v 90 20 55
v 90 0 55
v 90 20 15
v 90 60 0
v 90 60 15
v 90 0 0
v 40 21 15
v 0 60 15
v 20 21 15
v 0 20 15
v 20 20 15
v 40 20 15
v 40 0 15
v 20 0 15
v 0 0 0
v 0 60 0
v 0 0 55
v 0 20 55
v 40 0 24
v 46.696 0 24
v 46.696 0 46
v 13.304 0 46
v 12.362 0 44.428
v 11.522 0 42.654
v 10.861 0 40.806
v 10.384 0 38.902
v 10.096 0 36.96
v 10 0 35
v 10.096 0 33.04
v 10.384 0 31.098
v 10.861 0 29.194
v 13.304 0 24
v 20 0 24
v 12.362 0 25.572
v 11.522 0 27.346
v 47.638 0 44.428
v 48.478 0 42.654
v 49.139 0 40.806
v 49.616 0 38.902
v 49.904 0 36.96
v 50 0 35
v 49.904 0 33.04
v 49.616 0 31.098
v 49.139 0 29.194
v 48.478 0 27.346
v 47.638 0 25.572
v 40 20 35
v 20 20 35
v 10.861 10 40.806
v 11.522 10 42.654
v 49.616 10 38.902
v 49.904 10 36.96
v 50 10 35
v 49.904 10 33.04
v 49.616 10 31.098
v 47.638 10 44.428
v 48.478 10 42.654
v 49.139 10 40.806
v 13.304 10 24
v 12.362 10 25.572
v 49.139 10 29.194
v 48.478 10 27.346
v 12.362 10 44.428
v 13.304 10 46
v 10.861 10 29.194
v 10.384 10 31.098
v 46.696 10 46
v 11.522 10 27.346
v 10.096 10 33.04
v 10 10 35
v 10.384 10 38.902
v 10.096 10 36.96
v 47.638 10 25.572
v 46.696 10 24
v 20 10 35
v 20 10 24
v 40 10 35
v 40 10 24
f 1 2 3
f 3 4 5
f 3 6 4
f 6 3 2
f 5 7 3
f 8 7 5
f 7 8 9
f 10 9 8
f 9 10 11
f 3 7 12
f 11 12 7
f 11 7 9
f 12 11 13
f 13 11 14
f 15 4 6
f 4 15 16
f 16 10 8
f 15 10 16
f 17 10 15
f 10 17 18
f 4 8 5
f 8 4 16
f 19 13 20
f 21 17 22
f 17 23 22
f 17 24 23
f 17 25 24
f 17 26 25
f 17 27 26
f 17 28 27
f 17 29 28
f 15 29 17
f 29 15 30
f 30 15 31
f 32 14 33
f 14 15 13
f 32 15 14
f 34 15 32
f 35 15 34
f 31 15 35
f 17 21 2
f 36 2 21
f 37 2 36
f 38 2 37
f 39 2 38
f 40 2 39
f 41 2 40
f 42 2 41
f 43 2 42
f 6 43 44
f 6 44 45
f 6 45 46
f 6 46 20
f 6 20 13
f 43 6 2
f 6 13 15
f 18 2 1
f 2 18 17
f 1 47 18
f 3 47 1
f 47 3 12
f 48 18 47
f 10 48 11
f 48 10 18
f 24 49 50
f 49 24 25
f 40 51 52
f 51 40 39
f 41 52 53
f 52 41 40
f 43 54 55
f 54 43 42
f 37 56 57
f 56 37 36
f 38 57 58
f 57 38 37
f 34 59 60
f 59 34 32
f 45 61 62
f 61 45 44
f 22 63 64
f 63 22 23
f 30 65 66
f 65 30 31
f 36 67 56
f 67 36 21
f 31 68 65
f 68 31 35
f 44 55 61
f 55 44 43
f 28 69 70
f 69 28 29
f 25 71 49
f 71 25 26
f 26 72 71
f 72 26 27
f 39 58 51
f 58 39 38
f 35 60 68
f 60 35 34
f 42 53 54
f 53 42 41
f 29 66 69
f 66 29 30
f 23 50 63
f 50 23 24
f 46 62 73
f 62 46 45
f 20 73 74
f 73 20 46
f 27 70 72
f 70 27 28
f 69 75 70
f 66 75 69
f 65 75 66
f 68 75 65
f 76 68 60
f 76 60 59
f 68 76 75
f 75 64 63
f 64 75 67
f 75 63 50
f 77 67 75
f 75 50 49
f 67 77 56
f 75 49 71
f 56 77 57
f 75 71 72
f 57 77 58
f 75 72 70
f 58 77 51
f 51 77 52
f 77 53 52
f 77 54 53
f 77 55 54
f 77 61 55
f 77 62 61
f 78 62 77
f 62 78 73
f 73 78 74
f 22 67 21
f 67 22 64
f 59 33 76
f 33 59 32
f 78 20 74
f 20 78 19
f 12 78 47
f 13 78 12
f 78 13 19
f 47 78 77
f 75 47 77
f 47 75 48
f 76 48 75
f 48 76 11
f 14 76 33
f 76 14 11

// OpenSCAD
// =======================================================
// Dinh nghia cac tham so kich thuoc tu ban ve
// =======================================================
LENGTH = 90;            // Chieu dai tong the (truc X)
WIDTH = 60;             // Chieu rong tong the (truc Y)
HEIGHT_BASE = 15;       // Chieu cao phan de (truc Z)
HEIGHT_UPPER = 40;      // Chieu cao phan tren L-shape (truc Z, tinh tu mat tren cua de)
DEPTH_UPPER = 20;       // Chieu sau cua phan tren L-shape (truc Y)

CYLINDER_DIAMETER = 18; // Duong kinh lo tron
CYLINDER_RADIUS = CYLINDER_DIAMETER / 2;

SEMI_CIRCLE_RADIUS = 20; // Ban kinh ranh ban nguyet
// Tam cua cung ban nguyet theo chieu Z se la: HEIGHT_BASE + HEIGHT_UPPER - SEMI_CIRCLE_RADIUS
// => 15 + 40 - 20 = 35

NOTCH_WIDTH = 20;       // Chieu rong ranh chu nhat
NOTCH_HEIGHT = 20;      // Chieu cao ranh chu nhat

// So do phan giai cho hinh tru (smoother circles)
$fn = 64;

// =======================================================
// Xay dung vat the 3D su dung OpenSCAD
// =======================================================

difference() {
    // 1. Khoi co ban: Gom phan de va phan L-shape phia tren
    union() {
        // Phan de: Khoi chu nhat kich thuoc [90, 60, 15]
        // Vi tri goc dau tien [0,0,0]
        cube([LENGTH, WIDTH, HEIGHT_BASE]);

        // Phan L-shape phia tren: Khoi chu nhat [90, 20, 40]
        // Dat tren cung cua phan de, flush voi canh Y=0
        // Vi tri bat dau cua khoi nay la [0, 0, HEIGHT_BASE]
        translate([0, 0, HEIGHT_BASE]) {
            cube([LENGTH, DEPTH_UPPER, HEIGHT_UPPER]);
        }
    }

    // 2. Cac chi tiet cat (Subtractive Features)

    // A. Lo tron xuyen tam (Diameter 18)
    // Tam lo:
    //   X = LENGTH / 2 = 90 / 2 = 45
    //   Y = WIDTH / 2 = 60 / 2 = 30 (tu hinh chieu bang)
    //   Z = HEIGHT_BASE + HEIGHT_UPPER / 2 = 15 + 40 / 2 = 35 (tu hinh chieu dung)
    translate([LENGTH / 2, WIDTH / 2, HEIGHT_BASE + HEIGHT_UPPER / 2]) {
        // Xoay hinh tru de truc cua no song song voi truc X (chieu dai)
        rotate([0, 90, 0]) {
            // Chieu cao hinh tru (h) lon hon LENGTH mot chut de dam bao cat het
            cylinder(h = LENGTH + 2, r = CYLINDER_RADIUS, center = true);
        }
    }

    // B. Ranh ban nguyet lom o mat truoc cua khoi tren
    // (Mat truoc la mat X-Z, Y=0. Khoi tren co chieu sau DEPTH_UPPER=20)
    // Tam cua cung ban nguyet:
    //   X = WIDTH / 2 = 60 / 2 = 30 (tam cua chieu rong 60mm)
    //   Y = DEPTH_UPPER / 2 = 20 / 2 = 10 (tam de cat xuyen qua chieu sau 20mm)
    //   Z = HEIGHT_BASE + HEIGHT_UPPER - SEMI_CIRCLE_RADIUS = 15 + 40 - 20 = 35
    translate([WIDTH / 2, DEPTH_UPPER / 2, HEIGHT_BASE + HEIGHT_UPPER - SEMI_CIRCLE_RADIUS]) {
        // Cylinder mac dinh truc H la truc Z.
        // Chung ta muon cat theo phuong Y (chieu sau). Vay xoay hinh tru de truc H la truc Y
        rotate([90, 0, 0]) { // Xoay 90 do quanh truc X
            // De tao ranh ban nguyet lom (concave semi-circle), ta can tru di nua phia tren cua hinh tru.
            // Su dung intersection de lay phan nua phia tren cua hinh tru lam dao cat.
            intersection() {
                // Hinh tru co chieu cao (H) lon hon DEPTH_UPPER de dam bao cat het
                cylinder(h = DEPTH_UPPER + 2, r = SEMI_CIRCLE_RADIUS, center = true);
                // Khoi hop de cat bo phan nua duoi, chi giu lai phan nua tren cua hinh tru.
                // Vi hinh tru center=true, nen Z cua no la [-R, R].
                // Chung ta muon giu lai phan Z > 0, nen khoi hop bat dau tu Z=0 len.
                translate([-SEMI_CIRCLE_RADIUS - 1, -DEPTH_UPPER/2 - 1, 0])
                    cube([SEMI_CIRCLE_RADIUS * 2 + 2, DEPTH_UPPER + 2, SEMI_CIRCLE_RADIUS + 1]);
            }
        }
    }

    // C. Ranh chu nhat o mat truoc cua khoi tren
    // (Rong 20, cao 20, sau 20)
    // Vi tri bat dau cua ranh:
    //   X = (WIDTH - NOTCH_WIDTH) / 2 = (60 - 20) / 2 = 20
    //   Y = -1 (cat tu ben ngoai vao de dam bao cat het phan tu Y=0)
    //   Z = HEIGHT_BASE = 15
    translate([(WIDTH - NOTCH_WIDTH) / 2, -1, HEIGHT_BASE]) {
        // Chieu sau cua khoi hop (Y) lon hon DEPTH_UPPER de dam bao cat het
        cube([NOTCH_WIDTH, DEPTH_UPPER + 2, NOTCH_HEIGHT]);
    }
}
